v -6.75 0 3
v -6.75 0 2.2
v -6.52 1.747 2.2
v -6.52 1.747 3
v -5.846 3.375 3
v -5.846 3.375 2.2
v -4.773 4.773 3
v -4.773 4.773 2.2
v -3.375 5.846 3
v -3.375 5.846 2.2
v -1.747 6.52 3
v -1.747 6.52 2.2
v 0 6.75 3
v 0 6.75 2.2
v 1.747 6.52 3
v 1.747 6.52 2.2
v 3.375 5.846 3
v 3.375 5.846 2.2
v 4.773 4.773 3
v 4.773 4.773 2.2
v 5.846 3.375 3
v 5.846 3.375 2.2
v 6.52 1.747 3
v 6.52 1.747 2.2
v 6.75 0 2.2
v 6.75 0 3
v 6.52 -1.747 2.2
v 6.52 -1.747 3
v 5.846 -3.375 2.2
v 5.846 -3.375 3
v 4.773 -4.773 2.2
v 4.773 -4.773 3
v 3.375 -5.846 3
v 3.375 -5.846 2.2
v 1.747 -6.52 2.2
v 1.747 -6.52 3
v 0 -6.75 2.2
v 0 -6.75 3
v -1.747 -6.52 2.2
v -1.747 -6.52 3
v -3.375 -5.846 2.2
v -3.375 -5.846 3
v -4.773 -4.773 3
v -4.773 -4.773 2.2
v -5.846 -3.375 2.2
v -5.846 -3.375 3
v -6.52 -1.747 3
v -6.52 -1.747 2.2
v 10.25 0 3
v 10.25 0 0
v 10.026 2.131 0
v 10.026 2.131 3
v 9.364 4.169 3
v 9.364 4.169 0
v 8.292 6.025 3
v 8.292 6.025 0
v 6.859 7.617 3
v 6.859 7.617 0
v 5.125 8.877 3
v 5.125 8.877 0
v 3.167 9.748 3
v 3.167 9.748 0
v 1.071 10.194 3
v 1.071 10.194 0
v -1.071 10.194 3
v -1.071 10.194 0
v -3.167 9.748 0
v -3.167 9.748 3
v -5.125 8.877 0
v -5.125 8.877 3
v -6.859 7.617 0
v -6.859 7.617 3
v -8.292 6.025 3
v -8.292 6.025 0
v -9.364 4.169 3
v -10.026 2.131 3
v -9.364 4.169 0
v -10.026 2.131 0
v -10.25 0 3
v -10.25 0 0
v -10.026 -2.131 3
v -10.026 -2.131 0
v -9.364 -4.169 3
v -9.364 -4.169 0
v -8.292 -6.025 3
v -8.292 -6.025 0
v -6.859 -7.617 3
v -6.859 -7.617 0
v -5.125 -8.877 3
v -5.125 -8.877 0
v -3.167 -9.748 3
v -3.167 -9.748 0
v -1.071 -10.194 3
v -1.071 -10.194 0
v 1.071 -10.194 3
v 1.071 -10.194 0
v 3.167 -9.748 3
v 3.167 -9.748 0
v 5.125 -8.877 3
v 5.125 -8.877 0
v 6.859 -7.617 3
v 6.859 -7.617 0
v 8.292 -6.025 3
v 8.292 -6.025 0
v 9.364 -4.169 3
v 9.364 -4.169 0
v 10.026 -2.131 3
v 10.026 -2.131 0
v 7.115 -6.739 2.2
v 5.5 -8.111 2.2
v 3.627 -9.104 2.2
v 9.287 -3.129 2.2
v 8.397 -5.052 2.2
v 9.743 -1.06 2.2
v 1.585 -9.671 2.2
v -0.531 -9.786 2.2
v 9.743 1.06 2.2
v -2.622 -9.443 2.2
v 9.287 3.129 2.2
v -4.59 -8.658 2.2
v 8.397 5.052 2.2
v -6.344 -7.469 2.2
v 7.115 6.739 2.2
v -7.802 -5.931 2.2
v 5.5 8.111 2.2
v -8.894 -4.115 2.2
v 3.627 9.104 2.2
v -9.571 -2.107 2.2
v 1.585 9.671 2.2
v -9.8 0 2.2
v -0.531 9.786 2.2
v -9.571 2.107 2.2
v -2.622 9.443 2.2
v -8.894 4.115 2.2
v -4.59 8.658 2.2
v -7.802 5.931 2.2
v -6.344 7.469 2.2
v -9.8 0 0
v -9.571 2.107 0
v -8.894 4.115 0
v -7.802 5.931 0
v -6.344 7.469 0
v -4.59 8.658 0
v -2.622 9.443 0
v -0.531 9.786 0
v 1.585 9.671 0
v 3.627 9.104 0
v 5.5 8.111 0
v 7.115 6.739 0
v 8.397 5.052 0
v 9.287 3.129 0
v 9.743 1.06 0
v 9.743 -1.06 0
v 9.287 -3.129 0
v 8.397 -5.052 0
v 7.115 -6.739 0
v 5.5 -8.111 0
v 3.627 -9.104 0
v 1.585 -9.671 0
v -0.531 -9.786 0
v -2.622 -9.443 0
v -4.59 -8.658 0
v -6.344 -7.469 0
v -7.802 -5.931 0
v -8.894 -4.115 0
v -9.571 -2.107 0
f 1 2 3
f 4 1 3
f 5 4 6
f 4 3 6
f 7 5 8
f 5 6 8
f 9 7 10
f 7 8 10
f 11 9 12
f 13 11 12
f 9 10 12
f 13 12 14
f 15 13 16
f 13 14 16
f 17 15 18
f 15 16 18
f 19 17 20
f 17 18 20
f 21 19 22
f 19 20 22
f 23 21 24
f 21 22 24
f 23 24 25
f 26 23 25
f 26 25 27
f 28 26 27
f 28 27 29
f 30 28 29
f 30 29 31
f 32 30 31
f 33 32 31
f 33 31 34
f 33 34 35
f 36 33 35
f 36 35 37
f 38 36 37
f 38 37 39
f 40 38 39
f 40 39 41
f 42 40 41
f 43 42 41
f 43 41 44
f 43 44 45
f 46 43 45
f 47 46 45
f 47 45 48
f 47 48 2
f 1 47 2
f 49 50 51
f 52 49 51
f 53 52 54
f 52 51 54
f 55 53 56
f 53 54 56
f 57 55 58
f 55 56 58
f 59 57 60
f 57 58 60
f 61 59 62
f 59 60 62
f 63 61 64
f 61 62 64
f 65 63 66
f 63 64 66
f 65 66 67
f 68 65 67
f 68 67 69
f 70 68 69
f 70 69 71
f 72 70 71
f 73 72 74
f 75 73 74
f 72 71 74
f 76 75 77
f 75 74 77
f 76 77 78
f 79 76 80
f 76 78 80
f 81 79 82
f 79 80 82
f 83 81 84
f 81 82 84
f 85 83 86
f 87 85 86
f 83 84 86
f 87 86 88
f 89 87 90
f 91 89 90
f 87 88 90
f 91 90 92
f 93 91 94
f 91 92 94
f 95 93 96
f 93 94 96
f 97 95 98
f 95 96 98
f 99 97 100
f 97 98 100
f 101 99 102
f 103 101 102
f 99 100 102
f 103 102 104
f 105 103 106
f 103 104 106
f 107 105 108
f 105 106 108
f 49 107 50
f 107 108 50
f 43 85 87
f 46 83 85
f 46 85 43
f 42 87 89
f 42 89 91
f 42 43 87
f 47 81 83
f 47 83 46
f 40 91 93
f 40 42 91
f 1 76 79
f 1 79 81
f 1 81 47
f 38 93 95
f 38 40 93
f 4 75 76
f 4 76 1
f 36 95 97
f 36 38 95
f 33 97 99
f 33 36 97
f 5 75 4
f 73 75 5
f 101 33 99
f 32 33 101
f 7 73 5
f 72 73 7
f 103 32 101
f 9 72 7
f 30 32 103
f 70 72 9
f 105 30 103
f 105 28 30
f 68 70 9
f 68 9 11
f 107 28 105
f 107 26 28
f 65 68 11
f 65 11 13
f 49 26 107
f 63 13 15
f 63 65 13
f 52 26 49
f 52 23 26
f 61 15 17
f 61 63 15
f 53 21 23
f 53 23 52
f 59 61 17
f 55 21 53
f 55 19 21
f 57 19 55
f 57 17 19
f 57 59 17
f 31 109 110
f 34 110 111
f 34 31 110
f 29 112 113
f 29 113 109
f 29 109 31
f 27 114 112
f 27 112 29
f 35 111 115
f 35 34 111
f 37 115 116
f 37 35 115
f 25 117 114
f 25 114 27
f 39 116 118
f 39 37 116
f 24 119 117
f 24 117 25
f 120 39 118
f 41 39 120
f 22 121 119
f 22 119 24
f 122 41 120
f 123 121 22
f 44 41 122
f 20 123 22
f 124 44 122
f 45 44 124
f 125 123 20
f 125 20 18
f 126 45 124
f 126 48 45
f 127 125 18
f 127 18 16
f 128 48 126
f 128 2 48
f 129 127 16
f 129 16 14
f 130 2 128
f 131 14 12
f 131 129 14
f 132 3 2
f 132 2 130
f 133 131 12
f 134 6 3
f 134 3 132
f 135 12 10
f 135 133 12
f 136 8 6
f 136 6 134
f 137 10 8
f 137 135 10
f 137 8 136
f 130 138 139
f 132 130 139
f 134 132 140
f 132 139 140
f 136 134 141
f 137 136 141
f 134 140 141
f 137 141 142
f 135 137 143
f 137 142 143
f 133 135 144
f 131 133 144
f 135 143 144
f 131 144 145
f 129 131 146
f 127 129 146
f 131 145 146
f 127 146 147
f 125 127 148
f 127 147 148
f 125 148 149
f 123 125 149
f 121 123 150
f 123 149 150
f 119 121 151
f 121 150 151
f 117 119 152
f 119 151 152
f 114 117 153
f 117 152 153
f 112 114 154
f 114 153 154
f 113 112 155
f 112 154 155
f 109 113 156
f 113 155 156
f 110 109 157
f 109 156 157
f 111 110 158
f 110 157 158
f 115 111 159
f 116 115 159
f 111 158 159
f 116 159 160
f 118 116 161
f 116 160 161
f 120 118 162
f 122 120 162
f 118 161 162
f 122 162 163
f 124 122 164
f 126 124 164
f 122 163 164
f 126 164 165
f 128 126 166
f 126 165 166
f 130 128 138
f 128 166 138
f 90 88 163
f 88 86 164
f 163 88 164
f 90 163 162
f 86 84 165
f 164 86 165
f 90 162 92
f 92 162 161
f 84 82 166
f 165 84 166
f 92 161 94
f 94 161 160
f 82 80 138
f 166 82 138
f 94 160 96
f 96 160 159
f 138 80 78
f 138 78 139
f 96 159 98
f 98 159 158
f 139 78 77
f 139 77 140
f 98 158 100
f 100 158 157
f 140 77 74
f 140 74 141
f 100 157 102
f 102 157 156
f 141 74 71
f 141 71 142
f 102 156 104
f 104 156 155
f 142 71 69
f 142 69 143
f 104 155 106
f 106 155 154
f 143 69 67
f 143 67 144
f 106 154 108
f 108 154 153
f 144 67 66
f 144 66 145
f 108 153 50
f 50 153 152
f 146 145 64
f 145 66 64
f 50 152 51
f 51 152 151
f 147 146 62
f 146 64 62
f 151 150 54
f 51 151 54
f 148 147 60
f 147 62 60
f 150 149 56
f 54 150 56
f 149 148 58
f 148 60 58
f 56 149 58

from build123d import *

# Parameters (mm, degrees)
ESBO_O1_R                = 10.25
RESSALTO_EXTRUS_O1_DEPTH = 3
ESBO_O2_R                = 9.8
CORTE_EXTRUS_O1_DEPTH    = 2.2
ESBO_O3_R                = 6.75
CORTE_EXTRUS_O2_DEPTH    = 15.66168476


with BuildPart() as part:
    # Esboço1 → Ressalto-extrusão1 (new body)
    with BuildSketch(Plane.XY):
        Circle(ESBO_O1_R)
    extrude(amount=RESSALTO_EXTRUS_O1_DEPTH)

    # Esboço2 → Corte-extrusão1 (cut)
    with BuildSketch(Plane(origin=(0, 0, 0), x_dir=(-1, 0, 0), z_dir=(0, 0, -1))):
        Circle(ESBO_O2_R)
    extrude(amount=-CORTE_EXTRUS_O1_DEPTH, mode=Mode.SUBTRACT)

    # Esboço3 → Corte-extrusão2 (cut, through all)
    with BuildSketch(Plane(origin=(0, 0, 2.2), x_dir=(-1, 0, 0), z_dir=(0, 0, -1))):
        Circle(ESBO_O3_R)
    extrude(amount=-CORTE_EXTRUS_O2_DEPTH, mode=Mode.SUBTRACT)


solid = part.part
